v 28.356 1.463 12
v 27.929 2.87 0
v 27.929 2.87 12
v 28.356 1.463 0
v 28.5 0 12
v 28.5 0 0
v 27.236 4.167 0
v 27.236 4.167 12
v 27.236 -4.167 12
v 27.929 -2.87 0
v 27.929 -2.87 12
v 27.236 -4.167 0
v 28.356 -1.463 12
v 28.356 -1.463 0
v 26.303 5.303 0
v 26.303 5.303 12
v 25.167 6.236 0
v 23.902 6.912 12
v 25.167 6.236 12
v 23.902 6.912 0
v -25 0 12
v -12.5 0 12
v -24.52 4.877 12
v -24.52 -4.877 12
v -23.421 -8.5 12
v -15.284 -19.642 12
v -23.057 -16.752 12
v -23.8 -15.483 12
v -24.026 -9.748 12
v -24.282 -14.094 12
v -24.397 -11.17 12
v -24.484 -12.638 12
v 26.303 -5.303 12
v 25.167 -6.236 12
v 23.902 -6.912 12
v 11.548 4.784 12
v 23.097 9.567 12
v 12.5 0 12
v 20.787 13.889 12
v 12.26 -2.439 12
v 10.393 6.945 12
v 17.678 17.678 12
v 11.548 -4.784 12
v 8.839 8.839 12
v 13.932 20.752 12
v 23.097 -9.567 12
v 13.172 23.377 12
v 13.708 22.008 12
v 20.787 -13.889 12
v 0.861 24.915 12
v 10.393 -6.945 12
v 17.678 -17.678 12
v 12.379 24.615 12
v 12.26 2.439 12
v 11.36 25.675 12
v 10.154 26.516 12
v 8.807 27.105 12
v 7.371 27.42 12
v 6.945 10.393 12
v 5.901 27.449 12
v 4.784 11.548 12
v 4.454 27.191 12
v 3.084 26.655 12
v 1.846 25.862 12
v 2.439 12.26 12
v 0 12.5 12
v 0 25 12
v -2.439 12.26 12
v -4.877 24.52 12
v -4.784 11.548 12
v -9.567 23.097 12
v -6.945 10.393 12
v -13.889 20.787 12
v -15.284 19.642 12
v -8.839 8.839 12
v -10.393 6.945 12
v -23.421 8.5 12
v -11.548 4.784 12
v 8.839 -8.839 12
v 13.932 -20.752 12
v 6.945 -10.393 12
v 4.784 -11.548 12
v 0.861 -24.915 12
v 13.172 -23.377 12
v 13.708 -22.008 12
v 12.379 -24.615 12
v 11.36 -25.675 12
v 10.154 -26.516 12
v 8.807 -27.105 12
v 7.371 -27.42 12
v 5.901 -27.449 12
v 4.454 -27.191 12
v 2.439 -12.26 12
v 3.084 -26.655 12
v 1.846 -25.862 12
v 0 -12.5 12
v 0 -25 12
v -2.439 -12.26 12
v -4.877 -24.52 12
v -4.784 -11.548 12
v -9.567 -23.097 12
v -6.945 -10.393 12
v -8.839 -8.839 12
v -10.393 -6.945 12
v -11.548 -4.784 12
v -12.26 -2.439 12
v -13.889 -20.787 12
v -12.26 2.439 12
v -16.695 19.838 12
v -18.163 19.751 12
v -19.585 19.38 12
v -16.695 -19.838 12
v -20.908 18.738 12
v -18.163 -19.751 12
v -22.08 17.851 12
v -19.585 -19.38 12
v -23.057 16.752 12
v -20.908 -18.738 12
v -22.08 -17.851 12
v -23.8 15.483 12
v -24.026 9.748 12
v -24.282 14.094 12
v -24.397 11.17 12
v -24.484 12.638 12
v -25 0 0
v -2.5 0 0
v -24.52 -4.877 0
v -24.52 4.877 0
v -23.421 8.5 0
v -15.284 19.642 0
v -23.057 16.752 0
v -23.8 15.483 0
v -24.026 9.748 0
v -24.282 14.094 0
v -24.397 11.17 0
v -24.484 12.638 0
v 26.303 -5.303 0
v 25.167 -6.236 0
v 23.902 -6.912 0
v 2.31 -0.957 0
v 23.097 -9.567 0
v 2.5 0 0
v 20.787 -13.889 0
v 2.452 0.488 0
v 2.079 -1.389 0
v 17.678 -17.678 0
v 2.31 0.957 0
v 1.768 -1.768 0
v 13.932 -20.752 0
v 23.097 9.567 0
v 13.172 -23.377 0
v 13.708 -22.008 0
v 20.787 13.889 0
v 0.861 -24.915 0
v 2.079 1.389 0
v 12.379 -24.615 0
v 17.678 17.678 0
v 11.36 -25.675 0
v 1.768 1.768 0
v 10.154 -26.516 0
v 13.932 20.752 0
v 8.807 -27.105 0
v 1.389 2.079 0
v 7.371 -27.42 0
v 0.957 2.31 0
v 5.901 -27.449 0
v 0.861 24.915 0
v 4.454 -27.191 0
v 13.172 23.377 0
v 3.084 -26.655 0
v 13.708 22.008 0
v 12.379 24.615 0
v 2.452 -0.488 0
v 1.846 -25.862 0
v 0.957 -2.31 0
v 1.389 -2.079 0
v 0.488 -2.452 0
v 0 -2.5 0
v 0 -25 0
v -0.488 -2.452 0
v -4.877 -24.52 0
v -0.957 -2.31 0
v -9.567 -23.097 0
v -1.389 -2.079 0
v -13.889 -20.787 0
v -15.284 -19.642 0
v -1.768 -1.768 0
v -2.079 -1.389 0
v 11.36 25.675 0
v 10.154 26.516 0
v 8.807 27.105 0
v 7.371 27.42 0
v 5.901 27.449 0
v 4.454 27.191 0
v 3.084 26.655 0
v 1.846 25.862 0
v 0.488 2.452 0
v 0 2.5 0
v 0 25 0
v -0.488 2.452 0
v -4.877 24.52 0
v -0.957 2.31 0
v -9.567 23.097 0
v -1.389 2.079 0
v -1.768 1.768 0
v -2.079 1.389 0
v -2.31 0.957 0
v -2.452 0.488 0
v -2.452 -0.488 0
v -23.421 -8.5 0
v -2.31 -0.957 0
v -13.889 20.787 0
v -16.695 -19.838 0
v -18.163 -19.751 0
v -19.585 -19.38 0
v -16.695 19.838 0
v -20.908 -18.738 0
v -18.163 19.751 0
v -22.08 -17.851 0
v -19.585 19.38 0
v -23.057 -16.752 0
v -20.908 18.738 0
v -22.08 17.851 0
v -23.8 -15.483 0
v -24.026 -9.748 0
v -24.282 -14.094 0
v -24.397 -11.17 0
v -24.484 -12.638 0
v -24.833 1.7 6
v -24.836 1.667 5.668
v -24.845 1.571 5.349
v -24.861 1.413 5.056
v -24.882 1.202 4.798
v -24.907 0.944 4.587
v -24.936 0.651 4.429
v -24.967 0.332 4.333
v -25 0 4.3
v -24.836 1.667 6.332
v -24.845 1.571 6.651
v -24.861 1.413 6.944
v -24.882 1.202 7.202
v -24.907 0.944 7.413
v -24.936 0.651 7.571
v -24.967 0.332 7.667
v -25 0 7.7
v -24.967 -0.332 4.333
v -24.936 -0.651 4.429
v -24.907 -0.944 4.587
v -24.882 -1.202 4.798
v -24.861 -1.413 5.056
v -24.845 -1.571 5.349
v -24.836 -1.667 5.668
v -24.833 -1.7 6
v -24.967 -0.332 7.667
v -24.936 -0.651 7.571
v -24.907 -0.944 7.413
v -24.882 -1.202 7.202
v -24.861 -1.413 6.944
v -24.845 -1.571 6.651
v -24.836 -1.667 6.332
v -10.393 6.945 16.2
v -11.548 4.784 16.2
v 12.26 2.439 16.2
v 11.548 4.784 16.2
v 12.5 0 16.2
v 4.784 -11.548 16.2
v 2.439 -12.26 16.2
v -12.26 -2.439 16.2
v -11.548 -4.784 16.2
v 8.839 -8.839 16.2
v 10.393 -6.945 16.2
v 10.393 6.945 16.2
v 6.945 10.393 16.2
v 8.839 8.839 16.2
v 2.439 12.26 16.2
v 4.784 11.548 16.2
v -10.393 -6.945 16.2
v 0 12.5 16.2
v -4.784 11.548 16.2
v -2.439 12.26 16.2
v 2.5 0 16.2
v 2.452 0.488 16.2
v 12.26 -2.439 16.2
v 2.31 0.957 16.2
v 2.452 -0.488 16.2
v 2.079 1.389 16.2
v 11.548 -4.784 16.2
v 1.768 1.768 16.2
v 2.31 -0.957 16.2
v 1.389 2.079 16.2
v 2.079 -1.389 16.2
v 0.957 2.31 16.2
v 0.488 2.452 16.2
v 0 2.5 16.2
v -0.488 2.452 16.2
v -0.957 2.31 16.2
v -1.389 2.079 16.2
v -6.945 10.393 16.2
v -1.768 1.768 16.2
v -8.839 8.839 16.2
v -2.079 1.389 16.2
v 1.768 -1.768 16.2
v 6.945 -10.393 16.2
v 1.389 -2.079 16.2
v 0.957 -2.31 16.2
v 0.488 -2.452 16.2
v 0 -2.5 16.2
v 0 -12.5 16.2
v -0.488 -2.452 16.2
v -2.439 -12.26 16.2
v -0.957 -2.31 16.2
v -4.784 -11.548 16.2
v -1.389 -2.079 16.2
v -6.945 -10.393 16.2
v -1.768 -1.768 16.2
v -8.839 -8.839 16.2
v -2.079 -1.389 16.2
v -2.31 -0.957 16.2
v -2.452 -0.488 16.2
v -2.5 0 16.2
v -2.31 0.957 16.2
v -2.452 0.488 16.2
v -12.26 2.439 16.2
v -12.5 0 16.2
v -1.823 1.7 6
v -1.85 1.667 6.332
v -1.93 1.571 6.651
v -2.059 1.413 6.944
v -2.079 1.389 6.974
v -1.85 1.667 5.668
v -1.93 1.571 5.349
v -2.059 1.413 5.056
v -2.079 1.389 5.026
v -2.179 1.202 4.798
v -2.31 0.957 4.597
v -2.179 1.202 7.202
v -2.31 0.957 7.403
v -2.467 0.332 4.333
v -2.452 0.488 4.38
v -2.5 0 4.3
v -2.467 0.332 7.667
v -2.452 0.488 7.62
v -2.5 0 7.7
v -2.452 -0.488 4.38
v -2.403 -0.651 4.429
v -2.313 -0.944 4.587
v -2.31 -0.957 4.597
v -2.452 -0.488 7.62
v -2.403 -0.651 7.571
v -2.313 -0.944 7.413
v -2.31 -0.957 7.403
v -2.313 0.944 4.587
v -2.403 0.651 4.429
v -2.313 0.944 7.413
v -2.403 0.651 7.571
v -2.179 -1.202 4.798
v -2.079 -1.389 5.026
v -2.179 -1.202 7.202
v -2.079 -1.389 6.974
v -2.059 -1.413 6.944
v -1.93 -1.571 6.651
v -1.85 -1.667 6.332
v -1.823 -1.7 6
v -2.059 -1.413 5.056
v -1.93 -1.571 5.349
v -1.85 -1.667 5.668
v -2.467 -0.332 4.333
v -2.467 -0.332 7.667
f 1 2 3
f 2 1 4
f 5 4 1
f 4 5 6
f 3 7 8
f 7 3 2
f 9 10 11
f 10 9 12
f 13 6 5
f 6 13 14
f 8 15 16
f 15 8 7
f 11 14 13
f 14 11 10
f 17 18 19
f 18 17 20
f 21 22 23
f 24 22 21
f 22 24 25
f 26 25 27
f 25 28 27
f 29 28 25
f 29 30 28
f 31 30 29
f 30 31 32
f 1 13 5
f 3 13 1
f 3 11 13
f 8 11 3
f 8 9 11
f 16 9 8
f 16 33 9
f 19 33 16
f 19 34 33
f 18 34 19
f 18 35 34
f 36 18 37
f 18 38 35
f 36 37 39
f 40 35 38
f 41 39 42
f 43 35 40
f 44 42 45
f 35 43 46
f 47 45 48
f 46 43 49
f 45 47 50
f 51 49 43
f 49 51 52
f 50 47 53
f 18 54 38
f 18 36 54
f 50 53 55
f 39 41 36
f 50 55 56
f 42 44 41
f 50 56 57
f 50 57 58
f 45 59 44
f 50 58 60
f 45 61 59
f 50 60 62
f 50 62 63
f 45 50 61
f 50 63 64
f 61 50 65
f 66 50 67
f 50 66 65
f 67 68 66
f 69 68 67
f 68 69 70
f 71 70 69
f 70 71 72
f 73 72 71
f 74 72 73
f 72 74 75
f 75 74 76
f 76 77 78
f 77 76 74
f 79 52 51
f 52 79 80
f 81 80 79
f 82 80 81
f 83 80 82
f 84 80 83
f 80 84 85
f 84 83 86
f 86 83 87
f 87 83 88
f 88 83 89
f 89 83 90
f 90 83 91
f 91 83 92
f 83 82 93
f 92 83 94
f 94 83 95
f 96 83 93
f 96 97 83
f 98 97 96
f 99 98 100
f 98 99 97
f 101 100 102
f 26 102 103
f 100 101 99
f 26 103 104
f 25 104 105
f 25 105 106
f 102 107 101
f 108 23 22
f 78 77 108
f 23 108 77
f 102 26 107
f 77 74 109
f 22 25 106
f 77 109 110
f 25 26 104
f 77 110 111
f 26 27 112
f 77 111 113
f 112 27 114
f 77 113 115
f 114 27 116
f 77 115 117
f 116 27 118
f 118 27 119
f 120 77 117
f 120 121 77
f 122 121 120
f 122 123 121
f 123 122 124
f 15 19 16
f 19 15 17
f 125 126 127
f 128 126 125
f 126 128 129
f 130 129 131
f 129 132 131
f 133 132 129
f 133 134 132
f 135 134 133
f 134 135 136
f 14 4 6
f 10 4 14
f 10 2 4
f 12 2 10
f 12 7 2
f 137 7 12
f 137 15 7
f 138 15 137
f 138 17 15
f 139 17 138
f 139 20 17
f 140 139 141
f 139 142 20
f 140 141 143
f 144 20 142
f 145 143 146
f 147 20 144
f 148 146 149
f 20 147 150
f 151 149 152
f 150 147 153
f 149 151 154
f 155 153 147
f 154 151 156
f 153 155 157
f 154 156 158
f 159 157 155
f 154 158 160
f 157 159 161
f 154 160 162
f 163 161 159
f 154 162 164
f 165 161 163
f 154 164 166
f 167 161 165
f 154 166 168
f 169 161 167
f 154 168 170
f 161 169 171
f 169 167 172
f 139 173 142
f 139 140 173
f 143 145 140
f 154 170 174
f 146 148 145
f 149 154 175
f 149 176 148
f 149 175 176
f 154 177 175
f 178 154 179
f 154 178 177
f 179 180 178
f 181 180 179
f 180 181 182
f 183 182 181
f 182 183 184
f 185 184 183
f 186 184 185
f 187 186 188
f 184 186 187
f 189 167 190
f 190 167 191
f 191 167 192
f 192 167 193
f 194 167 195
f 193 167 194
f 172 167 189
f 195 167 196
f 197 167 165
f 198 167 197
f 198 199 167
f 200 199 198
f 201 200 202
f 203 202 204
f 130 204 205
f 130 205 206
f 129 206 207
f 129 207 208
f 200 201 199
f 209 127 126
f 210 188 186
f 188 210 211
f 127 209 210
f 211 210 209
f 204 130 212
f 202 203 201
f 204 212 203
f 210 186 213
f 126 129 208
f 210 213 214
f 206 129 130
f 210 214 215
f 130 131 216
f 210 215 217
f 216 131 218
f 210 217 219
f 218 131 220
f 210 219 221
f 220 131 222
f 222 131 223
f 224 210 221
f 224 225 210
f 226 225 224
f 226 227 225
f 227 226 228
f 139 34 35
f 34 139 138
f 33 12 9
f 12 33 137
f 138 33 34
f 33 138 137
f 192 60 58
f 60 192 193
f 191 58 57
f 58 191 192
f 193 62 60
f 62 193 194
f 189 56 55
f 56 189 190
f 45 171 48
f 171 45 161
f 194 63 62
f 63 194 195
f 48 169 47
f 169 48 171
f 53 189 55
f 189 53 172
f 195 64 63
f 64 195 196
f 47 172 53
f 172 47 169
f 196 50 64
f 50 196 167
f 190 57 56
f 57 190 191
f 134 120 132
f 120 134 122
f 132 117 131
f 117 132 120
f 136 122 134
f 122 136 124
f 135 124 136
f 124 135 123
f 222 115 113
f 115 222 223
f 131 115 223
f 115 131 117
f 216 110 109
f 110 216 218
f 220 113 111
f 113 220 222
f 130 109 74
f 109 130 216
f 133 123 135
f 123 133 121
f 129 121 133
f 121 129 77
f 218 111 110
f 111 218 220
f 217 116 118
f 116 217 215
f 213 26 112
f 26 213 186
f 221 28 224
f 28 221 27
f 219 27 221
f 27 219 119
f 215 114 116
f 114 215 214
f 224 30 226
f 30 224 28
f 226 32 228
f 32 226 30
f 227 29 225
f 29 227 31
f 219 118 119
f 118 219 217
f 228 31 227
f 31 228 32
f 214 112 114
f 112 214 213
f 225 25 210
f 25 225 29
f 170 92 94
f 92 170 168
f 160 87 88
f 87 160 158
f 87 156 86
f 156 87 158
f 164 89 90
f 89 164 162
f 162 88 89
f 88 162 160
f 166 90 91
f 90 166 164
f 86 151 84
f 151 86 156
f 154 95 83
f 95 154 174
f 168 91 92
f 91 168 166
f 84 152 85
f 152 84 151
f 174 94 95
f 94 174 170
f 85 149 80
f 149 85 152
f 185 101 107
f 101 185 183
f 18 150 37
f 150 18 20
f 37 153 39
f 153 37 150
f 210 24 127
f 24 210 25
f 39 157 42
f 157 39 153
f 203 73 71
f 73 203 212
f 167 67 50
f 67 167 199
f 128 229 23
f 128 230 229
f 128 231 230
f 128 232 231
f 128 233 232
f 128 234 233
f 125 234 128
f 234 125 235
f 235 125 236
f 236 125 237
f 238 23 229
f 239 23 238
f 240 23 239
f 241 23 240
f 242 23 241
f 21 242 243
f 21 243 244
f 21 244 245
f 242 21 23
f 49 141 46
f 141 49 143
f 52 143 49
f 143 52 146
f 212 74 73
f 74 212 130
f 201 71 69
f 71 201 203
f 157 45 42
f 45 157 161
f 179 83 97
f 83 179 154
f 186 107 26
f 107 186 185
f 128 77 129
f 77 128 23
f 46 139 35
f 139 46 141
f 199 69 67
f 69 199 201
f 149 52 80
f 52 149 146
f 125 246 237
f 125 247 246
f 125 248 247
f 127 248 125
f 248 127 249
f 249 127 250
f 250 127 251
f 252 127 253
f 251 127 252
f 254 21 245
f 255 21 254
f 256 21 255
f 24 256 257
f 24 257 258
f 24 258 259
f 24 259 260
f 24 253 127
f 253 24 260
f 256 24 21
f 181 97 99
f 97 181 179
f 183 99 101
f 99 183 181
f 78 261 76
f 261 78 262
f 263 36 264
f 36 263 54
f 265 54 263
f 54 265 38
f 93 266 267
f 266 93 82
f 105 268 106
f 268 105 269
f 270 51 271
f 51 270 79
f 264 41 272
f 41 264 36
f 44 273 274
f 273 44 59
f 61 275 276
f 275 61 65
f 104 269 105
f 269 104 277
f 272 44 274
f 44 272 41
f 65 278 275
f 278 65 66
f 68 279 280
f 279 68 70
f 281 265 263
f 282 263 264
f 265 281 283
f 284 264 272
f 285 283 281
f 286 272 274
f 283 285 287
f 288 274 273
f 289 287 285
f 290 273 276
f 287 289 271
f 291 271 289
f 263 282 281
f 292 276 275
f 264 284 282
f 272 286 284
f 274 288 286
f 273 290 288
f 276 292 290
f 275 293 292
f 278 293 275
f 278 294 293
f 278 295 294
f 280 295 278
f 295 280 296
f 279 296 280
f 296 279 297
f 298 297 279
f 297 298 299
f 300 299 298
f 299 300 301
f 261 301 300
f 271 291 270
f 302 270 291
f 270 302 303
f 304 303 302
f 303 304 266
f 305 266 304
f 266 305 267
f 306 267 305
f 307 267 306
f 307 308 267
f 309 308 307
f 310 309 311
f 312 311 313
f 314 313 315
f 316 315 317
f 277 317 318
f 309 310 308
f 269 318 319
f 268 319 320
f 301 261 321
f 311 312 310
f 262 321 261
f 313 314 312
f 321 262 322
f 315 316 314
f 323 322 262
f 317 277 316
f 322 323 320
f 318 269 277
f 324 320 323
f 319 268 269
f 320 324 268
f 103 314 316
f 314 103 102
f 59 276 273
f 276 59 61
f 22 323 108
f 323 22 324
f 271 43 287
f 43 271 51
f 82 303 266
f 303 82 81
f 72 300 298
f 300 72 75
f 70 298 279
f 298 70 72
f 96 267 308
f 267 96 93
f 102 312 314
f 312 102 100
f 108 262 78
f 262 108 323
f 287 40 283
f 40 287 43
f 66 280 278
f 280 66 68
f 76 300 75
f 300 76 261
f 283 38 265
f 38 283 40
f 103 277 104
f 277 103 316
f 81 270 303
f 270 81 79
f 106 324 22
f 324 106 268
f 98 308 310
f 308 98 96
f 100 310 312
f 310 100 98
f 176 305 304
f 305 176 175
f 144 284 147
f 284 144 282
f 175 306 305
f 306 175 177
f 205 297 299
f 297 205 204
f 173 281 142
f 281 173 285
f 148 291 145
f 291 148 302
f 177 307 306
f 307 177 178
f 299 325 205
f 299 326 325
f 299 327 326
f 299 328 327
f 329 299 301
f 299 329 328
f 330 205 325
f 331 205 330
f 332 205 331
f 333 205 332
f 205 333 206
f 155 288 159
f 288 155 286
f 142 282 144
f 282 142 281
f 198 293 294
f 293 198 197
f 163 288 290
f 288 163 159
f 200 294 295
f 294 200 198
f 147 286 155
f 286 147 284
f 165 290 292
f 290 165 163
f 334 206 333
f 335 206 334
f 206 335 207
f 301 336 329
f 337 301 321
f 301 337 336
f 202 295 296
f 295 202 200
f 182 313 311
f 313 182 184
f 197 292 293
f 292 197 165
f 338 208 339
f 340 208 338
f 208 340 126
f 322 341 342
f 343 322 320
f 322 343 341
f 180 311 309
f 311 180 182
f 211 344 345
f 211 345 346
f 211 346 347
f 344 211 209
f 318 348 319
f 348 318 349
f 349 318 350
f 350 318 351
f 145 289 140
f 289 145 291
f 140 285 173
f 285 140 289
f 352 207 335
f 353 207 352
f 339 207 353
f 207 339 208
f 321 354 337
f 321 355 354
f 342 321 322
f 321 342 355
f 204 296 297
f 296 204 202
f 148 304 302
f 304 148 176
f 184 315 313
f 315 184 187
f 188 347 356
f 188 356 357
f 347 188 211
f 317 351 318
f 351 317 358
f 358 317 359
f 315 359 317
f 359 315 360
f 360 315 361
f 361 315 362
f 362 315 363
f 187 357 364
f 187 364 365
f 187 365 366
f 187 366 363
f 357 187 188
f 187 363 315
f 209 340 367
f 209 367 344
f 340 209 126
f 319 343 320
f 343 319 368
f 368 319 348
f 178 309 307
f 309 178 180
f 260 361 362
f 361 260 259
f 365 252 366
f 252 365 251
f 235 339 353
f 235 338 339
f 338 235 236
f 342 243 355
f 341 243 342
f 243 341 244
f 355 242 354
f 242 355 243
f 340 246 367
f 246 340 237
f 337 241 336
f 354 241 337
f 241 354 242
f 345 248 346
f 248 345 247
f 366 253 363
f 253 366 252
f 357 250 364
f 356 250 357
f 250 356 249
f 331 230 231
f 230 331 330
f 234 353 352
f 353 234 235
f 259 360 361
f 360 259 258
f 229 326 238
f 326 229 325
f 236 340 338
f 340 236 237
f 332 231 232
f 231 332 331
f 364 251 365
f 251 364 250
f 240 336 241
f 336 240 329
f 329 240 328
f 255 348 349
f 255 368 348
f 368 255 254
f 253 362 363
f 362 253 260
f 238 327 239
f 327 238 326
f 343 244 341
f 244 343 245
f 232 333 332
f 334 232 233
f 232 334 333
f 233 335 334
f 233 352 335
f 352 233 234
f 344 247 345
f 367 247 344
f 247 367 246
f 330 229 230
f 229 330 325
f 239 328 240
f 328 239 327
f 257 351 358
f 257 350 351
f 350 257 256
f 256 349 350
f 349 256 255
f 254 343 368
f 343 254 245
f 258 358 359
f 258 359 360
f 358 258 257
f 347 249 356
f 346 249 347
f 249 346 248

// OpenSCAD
$fn = 32;

// ----------------------------------------------------------------------
// Hand knob: 50 x 50 x 16.2 mm
// ----------------------------------------------------------------------

// --- parameters (mm) ---
head_d = 50;              // knob diameter
head_h = 12;              // knob height
hole_d = 5;               // shaft bore
set_d = 3.4;              // set screw tap hole
notch_d = 1.02;           // knurl groove diameter
lobes = 5;                // grip lobes
cap_h = 4.2;              // raised centre cap
cap_d = 25;               // centre cap diameter

module body() {
  cylinder(h = head_h, d = head_d);
  for (i = [0 : lobes - 1])
    rotate([0, 0, i * 360 / lobes])
      translate([head_d * 0.42, 0, 0])
        cylinder(h = head_h, d = head_d * 0.3);
}

module cap() {
  translate([0, 0, head_h - 1]) cylinder(h = cap_h + 1, d = cap_d);
}

difference() {
  union() {
    body();
    cap();
  }
  translate([0, 0, -1]) cylinder(h = head_h + cap_h + 2, d = hole_d);
  translate([-head_d / 2 - 1, 0, head_h * 0.5]) rotate([0, 90, 0]) cylinder(h = head_d / 2 + 2, d = set_d);
}
